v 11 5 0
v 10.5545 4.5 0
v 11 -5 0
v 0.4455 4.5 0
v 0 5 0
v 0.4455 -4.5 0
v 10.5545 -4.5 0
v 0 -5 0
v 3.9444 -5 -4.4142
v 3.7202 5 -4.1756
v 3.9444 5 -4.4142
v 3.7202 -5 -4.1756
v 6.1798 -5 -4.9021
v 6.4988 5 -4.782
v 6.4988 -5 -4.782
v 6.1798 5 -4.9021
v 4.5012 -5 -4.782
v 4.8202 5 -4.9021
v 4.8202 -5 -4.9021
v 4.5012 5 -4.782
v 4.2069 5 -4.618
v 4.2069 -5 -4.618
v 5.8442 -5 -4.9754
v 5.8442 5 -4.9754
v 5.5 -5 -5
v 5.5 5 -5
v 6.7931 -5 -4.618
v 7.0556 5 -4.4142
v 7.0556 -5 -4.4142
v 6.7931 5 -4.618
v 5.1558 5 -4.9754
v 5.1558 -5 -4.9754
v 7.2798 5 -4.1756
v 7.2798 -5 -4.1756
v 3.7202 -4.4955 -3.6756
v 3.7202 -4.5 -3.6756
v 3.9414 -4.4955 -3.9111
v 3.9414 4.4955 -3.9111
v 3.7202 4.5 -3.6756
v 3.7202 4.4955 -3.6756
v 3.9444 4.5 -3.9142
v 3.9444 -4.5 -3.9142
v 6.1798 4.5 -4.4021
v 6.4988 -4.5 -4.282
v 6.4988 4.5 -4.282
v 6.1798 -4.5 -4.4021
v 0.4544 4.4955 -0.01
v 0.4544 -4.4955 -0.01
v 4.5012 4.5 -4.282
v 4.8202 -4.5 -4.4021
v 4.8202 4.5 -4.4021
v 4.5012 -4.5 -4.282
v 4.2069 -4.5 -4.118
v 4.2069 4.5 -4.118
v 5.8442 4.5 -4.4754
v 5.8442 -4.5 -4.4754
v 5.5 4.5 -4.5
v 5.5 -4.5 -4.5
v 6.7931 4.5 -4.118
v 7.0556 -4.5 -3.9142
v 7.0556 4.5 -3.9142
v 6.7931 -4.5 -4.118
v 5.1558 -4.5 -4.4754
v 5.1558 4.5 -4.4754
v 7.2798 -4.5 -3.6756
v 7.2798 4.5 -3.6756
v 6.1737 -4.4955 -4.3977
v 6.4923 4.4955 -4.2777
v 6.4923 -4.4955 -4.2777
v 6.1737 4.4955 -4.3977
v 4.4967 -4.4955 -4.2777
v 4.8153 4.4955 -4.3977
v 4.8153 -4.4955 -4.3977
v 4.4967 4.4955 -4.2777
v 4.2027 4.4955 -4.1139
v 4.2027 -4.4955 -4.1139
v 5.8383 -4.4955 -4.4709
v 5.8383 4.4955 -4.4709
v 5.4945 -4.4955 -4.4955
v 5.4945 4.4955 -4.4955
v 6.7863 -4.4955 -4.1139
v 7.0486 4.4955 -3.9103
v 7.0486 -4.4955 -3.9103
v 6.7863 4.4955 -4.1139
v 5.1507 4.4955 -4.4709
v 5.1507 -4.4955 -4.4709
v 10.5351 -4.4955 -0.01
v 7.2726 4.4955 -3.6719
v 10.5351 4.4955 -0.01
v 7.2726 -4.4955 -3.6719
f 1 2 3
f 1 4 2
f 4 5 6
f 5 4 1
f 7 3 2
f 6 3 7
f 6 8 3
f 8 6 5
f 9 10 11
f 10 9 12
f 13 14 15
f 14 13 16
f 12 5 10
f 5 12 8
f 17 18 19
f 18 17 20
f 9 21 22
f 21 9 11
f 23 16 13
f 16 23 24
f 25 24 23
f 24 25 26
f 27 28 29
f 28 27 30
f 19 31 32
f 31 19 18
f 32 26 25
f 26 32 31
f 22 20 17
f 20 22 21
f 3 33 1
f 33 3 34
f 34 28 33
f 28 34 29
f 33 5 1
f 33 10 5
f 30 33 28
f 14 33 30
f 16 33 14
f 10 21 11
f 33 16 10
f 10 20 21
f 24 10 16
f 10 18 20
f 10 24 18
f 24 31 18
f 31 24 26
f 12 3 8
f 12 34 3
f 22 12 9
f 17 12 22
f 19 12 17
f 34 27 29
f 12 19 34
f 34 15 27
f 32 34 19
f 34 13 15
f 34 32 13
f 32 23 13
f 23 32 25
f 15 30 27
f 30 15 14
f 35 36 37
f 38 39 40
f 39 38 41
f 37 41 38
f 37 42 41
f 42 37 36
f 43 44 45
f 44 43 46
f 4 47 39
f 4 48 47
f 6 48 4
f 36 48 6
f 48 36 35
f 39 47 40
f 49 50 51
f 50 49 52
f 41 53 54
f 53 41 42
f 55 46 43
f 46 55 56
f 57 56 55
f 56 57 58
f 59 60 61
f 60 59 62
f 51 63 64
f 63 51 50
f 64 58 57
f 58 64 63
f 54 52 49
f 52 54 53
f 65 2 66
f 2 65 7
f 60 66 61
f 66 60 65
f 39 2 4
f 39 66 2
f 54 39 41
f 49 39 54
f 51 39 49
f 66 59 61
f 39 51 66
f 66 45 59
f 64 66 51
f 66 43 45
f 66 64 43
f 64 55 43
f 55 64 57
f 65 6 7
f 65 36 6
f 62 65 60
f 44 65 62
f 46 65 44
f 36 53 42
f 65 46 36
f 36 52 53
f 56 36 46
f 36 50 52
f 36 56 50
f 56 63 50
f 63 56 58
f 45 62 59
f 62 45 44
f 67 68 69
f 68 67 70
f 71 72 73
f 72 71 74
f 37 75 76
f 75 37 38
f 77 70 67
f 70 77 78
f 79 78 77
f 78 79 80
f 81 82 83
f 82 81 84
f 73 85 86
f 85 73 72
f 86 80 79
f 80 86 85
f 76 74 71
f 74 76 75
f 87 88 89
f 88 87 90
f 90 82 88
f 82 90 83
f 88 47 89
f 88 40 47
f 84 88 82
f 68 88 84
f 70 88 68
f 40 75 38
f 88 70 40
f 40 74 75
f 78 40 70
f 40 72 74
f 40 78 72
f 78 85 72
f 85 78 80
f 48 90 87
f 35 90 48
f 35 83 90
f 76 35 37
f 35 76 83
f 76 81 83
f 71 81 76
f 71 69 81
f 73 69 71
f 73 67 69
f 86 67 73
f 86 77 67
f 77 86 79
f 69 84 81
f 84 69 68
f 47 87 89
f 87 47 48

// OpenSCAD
//A simple animation of a bucket, through emptying, this could be used for an animation of a water wheel of for construction equipent or something else

$fn = 40;
angle = 45 * $t;
size = [11,10,5];



bucketFilled(size, angle);


module bucketFilled(size, angle){
    
    color("blue")
    rotate([0,angle,0])
    resize(size)
    difference(){  
        bucketShape();
        translate([0,0,0.5])
        resize([0,9,0])
        bucketShape();
    }
    
    color("aqua", alpha=0.6)
    difference(){
        //water
        scale([0.999,0.999,0.999]) //prevents discolouration due to z-fighting
        rotate([0,angle,0])
        difference(){
            resize(size - [0,1,0])
            translate([0,0,0.5])
            resize([0,9,0])
            bucketShape();    
            translate([0,(size * -[0,0.5,0]), 0.001])
            cube(size);
        }
            
        //water leveller
        lipLevel = ((size * -[1,0,0]) + 0.5) * sin(angle) - 0.01 ;       
        translate([0,(size * -[0,0.5,0]) + 0.4, lipLevel])
        cube(size + [1,-0.8,100]);
    }
}



module bucket(size){
    resize(size) 
    difference(){  
        bucketShape();
        translate([0,0,0.5])
        resize([0,9,0])
        bucketShape();
    }
}


module bucketShape(){
    translate([0,5,0])
    rotate([90,0,0])
    hull() {
        linear_extrude(10)
        polygon(points=[[0,0],[10,0],[5,-2]]);
        translate([5,-3])
        cylinder(d=4,h=10);
    }
}
